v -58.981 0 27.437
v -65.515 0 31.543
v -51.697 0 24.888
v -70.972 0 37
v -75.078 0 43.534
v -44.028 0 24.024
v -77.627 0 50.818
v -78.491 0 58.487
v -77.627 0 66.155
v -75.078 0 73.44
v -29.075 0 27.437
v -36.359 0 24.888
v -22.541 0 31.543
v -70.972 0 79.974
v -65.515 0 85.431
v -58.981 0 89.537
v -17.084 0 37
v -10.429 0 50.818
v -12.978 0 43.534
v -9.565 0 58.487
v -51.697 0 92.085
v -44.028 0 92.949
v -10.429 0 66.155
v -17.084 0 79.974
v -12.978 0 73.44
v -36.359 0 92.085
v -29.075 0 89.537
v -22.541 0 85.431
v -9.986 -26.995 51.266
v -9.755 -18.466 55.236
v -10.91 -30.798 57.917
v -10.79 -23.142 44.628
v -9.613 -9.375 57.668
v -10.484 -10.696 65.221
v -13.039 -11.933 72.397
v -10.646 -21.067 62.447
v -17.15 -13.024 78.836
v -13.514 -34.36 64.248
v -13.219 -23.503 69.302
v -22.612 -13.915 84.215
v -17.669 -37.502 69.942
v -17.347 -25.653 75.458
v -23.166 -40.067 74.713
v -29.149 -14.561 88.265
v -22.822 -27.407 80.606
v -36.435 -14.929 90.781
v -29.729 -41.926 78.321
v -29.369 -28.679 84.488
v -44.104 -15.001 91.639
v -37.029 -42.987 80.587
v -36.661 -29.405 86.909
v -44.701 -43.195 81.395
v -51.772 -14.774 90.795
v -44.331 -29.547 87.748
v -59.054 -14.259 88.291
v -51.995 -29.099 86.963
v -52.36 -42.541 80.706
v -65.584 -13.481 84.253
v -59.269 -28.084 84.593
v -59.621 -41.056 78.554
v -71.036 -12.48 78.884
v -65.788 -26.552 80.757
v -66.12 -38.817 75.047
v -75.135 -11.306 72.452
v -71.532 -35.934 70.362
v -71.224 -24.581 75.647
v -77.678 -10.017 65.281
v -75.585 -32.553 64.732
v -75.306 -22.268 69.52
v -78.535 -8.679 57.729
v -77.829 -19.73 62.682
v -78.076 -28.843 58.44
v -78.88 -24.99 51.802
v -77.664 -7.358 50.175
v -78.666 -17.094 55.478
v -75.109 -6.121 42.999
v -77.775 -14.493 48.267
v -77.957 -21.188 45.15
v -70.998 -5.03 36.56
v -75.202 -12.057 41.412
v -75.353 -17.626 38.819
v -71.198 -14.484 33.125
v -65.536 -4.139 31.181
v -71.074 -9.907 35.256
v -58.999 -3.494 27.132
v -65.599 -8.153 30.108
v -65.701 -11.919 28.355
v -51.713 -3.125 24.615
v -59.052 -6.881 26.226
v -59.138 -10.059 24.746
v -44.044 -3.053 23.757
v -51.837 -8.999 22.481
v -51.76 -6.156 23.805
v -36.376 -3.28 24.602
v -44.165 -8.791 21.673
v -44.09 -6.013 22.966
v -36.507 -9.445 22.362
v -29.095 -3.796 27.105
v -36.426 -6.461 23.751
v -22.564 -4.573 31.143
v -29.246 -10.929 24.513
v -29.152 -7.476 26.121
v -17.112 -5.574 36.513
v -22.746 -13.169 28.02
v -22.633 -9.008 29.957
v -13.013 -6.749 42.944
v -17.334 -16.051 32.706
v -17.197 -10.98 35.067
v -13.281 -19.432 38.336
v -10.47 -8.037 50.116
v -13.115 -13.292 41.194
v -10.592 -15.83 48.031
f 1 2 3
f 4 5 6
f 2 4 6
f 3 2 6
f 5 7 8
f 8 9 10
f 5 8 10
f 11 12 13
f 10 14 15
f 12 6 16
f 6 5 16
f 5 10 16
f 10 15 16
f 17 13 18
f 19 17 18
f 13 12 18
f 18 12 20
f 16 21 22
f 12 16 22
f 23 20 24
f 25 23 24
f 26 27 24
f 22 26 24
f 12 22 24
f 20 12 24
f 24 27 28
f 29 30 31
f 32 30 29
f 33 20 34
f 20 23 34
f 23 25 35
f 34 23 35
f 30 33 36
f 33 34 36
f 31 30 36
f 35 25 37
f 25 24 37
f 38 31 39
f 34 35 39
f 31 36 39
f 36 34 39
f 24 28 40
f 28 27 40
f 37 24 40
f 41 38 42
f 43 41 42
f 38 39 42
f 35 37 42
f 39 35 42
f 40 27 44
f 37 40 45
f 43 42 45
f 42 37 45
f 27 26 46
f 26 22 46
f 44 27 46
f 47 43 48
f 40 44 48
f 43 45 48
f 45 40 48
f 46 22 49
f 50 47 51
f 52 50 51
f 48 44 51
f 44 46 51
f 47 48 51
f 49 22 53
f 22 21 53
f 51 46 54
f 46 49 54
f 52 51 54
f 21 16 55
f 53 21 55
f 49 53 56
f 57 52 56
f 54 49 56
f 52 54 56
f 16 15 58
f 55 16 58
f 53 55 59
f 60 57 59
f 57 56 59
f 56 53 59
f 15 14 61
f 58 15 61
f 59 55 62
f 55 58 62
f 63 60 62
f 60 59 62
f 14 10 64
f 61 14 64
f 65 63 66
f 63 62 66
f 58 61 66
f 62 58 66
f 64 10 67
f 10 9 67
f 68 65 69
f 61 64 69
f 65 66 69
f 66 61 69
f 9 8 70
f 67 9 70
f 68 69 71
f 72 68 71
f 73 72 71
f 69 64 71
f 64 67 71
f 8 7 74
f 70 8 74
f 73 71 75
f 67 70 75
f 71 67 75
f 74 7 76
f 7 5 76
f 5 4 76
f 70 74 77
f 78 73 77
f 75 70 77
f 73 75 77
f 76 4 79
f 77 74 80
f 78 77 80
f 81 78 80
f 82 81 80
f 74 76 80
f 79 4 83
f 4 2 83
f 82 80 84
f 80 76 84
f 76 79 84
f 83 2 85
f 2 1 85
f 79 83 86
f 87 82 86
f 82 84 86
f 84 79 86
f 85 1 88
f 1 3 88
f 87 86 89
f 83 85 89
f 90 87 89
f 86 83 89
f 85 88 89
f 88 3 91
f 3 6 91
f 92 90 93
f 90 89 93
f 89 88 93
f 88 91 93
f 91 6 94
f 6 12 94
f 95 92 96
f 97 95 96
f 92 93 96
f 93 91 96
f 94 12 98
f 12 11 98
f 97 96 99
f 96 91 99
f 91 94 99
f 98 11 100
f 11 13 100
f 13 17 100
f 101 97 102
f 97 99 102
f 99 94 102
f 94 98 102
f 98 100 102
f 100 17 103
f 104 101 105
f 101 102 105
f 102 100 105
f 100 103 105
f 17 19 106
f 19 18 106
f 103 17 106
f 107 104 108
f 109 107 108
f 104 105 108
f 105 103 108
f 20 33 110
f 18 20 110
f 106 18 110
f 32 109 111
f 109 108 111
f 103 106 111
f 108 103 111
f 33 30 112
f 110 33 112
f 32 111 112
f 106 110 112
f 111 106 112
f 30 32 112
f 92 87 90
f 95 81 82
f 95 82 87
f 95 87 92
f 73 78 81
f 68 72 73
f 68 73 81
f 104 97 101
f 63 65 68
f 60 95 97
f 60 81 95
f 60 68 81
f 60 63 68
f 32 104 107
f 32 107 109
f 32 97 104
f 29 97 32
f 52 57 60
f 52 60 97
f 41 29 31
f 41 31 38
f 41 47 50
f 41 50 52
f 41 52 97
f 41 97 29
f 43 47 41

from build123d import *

# Parameters (mm, degrees)
F0_R     = 33.863403
F0_W     = 34.403794
F0_H     = 23.062286
F1_DEPTH = 125
F2_SIZE  = 5
F3_R     = 5
F4_R     = 34.462721
F5_ANGLE = 30


with BuildPart() as f1:
    # F0 (on Front) → F1 (new body)
    with BuildSketch(Plane.XZ):
        Circle(F0_R)
        Rectangle(F0_W, F0_H, mode=Mode.SUBTRACT)
    extrude(amount=F1_DEPTH)

    # F2
    f2_edges = [f1.edges().sort_by_distance(p)[0] for p in [
        (-33.863403, -125, 0),
    ]]
    chamfer(f2_edges, length=F2_SIZE)

    # F3
    f3_edges = [f1.edges().sort_by_distance(p)[0] for p in [
        (0, -125, 11.531143),
        (-17.201897, -125, 0),
        (0, -125, -11.531143),
        (17.201897, -125, 0),
    ]]
    fillet(f3_edges, radius=F3_R)


with BuildPart() as f5:
    # F4 (on Front) → F5 (revolve)
    with BuildSketch(Plane.XZ):
        with Locations((-44.028118, 58.48673)):
            Circle(F4_R)
    revolve(axis=Axis((-18.287189, 0, 4.913061), (0.998307, 0, -0.058173)), revolution_arc=F5_ANGLE)


solid = f5.part
